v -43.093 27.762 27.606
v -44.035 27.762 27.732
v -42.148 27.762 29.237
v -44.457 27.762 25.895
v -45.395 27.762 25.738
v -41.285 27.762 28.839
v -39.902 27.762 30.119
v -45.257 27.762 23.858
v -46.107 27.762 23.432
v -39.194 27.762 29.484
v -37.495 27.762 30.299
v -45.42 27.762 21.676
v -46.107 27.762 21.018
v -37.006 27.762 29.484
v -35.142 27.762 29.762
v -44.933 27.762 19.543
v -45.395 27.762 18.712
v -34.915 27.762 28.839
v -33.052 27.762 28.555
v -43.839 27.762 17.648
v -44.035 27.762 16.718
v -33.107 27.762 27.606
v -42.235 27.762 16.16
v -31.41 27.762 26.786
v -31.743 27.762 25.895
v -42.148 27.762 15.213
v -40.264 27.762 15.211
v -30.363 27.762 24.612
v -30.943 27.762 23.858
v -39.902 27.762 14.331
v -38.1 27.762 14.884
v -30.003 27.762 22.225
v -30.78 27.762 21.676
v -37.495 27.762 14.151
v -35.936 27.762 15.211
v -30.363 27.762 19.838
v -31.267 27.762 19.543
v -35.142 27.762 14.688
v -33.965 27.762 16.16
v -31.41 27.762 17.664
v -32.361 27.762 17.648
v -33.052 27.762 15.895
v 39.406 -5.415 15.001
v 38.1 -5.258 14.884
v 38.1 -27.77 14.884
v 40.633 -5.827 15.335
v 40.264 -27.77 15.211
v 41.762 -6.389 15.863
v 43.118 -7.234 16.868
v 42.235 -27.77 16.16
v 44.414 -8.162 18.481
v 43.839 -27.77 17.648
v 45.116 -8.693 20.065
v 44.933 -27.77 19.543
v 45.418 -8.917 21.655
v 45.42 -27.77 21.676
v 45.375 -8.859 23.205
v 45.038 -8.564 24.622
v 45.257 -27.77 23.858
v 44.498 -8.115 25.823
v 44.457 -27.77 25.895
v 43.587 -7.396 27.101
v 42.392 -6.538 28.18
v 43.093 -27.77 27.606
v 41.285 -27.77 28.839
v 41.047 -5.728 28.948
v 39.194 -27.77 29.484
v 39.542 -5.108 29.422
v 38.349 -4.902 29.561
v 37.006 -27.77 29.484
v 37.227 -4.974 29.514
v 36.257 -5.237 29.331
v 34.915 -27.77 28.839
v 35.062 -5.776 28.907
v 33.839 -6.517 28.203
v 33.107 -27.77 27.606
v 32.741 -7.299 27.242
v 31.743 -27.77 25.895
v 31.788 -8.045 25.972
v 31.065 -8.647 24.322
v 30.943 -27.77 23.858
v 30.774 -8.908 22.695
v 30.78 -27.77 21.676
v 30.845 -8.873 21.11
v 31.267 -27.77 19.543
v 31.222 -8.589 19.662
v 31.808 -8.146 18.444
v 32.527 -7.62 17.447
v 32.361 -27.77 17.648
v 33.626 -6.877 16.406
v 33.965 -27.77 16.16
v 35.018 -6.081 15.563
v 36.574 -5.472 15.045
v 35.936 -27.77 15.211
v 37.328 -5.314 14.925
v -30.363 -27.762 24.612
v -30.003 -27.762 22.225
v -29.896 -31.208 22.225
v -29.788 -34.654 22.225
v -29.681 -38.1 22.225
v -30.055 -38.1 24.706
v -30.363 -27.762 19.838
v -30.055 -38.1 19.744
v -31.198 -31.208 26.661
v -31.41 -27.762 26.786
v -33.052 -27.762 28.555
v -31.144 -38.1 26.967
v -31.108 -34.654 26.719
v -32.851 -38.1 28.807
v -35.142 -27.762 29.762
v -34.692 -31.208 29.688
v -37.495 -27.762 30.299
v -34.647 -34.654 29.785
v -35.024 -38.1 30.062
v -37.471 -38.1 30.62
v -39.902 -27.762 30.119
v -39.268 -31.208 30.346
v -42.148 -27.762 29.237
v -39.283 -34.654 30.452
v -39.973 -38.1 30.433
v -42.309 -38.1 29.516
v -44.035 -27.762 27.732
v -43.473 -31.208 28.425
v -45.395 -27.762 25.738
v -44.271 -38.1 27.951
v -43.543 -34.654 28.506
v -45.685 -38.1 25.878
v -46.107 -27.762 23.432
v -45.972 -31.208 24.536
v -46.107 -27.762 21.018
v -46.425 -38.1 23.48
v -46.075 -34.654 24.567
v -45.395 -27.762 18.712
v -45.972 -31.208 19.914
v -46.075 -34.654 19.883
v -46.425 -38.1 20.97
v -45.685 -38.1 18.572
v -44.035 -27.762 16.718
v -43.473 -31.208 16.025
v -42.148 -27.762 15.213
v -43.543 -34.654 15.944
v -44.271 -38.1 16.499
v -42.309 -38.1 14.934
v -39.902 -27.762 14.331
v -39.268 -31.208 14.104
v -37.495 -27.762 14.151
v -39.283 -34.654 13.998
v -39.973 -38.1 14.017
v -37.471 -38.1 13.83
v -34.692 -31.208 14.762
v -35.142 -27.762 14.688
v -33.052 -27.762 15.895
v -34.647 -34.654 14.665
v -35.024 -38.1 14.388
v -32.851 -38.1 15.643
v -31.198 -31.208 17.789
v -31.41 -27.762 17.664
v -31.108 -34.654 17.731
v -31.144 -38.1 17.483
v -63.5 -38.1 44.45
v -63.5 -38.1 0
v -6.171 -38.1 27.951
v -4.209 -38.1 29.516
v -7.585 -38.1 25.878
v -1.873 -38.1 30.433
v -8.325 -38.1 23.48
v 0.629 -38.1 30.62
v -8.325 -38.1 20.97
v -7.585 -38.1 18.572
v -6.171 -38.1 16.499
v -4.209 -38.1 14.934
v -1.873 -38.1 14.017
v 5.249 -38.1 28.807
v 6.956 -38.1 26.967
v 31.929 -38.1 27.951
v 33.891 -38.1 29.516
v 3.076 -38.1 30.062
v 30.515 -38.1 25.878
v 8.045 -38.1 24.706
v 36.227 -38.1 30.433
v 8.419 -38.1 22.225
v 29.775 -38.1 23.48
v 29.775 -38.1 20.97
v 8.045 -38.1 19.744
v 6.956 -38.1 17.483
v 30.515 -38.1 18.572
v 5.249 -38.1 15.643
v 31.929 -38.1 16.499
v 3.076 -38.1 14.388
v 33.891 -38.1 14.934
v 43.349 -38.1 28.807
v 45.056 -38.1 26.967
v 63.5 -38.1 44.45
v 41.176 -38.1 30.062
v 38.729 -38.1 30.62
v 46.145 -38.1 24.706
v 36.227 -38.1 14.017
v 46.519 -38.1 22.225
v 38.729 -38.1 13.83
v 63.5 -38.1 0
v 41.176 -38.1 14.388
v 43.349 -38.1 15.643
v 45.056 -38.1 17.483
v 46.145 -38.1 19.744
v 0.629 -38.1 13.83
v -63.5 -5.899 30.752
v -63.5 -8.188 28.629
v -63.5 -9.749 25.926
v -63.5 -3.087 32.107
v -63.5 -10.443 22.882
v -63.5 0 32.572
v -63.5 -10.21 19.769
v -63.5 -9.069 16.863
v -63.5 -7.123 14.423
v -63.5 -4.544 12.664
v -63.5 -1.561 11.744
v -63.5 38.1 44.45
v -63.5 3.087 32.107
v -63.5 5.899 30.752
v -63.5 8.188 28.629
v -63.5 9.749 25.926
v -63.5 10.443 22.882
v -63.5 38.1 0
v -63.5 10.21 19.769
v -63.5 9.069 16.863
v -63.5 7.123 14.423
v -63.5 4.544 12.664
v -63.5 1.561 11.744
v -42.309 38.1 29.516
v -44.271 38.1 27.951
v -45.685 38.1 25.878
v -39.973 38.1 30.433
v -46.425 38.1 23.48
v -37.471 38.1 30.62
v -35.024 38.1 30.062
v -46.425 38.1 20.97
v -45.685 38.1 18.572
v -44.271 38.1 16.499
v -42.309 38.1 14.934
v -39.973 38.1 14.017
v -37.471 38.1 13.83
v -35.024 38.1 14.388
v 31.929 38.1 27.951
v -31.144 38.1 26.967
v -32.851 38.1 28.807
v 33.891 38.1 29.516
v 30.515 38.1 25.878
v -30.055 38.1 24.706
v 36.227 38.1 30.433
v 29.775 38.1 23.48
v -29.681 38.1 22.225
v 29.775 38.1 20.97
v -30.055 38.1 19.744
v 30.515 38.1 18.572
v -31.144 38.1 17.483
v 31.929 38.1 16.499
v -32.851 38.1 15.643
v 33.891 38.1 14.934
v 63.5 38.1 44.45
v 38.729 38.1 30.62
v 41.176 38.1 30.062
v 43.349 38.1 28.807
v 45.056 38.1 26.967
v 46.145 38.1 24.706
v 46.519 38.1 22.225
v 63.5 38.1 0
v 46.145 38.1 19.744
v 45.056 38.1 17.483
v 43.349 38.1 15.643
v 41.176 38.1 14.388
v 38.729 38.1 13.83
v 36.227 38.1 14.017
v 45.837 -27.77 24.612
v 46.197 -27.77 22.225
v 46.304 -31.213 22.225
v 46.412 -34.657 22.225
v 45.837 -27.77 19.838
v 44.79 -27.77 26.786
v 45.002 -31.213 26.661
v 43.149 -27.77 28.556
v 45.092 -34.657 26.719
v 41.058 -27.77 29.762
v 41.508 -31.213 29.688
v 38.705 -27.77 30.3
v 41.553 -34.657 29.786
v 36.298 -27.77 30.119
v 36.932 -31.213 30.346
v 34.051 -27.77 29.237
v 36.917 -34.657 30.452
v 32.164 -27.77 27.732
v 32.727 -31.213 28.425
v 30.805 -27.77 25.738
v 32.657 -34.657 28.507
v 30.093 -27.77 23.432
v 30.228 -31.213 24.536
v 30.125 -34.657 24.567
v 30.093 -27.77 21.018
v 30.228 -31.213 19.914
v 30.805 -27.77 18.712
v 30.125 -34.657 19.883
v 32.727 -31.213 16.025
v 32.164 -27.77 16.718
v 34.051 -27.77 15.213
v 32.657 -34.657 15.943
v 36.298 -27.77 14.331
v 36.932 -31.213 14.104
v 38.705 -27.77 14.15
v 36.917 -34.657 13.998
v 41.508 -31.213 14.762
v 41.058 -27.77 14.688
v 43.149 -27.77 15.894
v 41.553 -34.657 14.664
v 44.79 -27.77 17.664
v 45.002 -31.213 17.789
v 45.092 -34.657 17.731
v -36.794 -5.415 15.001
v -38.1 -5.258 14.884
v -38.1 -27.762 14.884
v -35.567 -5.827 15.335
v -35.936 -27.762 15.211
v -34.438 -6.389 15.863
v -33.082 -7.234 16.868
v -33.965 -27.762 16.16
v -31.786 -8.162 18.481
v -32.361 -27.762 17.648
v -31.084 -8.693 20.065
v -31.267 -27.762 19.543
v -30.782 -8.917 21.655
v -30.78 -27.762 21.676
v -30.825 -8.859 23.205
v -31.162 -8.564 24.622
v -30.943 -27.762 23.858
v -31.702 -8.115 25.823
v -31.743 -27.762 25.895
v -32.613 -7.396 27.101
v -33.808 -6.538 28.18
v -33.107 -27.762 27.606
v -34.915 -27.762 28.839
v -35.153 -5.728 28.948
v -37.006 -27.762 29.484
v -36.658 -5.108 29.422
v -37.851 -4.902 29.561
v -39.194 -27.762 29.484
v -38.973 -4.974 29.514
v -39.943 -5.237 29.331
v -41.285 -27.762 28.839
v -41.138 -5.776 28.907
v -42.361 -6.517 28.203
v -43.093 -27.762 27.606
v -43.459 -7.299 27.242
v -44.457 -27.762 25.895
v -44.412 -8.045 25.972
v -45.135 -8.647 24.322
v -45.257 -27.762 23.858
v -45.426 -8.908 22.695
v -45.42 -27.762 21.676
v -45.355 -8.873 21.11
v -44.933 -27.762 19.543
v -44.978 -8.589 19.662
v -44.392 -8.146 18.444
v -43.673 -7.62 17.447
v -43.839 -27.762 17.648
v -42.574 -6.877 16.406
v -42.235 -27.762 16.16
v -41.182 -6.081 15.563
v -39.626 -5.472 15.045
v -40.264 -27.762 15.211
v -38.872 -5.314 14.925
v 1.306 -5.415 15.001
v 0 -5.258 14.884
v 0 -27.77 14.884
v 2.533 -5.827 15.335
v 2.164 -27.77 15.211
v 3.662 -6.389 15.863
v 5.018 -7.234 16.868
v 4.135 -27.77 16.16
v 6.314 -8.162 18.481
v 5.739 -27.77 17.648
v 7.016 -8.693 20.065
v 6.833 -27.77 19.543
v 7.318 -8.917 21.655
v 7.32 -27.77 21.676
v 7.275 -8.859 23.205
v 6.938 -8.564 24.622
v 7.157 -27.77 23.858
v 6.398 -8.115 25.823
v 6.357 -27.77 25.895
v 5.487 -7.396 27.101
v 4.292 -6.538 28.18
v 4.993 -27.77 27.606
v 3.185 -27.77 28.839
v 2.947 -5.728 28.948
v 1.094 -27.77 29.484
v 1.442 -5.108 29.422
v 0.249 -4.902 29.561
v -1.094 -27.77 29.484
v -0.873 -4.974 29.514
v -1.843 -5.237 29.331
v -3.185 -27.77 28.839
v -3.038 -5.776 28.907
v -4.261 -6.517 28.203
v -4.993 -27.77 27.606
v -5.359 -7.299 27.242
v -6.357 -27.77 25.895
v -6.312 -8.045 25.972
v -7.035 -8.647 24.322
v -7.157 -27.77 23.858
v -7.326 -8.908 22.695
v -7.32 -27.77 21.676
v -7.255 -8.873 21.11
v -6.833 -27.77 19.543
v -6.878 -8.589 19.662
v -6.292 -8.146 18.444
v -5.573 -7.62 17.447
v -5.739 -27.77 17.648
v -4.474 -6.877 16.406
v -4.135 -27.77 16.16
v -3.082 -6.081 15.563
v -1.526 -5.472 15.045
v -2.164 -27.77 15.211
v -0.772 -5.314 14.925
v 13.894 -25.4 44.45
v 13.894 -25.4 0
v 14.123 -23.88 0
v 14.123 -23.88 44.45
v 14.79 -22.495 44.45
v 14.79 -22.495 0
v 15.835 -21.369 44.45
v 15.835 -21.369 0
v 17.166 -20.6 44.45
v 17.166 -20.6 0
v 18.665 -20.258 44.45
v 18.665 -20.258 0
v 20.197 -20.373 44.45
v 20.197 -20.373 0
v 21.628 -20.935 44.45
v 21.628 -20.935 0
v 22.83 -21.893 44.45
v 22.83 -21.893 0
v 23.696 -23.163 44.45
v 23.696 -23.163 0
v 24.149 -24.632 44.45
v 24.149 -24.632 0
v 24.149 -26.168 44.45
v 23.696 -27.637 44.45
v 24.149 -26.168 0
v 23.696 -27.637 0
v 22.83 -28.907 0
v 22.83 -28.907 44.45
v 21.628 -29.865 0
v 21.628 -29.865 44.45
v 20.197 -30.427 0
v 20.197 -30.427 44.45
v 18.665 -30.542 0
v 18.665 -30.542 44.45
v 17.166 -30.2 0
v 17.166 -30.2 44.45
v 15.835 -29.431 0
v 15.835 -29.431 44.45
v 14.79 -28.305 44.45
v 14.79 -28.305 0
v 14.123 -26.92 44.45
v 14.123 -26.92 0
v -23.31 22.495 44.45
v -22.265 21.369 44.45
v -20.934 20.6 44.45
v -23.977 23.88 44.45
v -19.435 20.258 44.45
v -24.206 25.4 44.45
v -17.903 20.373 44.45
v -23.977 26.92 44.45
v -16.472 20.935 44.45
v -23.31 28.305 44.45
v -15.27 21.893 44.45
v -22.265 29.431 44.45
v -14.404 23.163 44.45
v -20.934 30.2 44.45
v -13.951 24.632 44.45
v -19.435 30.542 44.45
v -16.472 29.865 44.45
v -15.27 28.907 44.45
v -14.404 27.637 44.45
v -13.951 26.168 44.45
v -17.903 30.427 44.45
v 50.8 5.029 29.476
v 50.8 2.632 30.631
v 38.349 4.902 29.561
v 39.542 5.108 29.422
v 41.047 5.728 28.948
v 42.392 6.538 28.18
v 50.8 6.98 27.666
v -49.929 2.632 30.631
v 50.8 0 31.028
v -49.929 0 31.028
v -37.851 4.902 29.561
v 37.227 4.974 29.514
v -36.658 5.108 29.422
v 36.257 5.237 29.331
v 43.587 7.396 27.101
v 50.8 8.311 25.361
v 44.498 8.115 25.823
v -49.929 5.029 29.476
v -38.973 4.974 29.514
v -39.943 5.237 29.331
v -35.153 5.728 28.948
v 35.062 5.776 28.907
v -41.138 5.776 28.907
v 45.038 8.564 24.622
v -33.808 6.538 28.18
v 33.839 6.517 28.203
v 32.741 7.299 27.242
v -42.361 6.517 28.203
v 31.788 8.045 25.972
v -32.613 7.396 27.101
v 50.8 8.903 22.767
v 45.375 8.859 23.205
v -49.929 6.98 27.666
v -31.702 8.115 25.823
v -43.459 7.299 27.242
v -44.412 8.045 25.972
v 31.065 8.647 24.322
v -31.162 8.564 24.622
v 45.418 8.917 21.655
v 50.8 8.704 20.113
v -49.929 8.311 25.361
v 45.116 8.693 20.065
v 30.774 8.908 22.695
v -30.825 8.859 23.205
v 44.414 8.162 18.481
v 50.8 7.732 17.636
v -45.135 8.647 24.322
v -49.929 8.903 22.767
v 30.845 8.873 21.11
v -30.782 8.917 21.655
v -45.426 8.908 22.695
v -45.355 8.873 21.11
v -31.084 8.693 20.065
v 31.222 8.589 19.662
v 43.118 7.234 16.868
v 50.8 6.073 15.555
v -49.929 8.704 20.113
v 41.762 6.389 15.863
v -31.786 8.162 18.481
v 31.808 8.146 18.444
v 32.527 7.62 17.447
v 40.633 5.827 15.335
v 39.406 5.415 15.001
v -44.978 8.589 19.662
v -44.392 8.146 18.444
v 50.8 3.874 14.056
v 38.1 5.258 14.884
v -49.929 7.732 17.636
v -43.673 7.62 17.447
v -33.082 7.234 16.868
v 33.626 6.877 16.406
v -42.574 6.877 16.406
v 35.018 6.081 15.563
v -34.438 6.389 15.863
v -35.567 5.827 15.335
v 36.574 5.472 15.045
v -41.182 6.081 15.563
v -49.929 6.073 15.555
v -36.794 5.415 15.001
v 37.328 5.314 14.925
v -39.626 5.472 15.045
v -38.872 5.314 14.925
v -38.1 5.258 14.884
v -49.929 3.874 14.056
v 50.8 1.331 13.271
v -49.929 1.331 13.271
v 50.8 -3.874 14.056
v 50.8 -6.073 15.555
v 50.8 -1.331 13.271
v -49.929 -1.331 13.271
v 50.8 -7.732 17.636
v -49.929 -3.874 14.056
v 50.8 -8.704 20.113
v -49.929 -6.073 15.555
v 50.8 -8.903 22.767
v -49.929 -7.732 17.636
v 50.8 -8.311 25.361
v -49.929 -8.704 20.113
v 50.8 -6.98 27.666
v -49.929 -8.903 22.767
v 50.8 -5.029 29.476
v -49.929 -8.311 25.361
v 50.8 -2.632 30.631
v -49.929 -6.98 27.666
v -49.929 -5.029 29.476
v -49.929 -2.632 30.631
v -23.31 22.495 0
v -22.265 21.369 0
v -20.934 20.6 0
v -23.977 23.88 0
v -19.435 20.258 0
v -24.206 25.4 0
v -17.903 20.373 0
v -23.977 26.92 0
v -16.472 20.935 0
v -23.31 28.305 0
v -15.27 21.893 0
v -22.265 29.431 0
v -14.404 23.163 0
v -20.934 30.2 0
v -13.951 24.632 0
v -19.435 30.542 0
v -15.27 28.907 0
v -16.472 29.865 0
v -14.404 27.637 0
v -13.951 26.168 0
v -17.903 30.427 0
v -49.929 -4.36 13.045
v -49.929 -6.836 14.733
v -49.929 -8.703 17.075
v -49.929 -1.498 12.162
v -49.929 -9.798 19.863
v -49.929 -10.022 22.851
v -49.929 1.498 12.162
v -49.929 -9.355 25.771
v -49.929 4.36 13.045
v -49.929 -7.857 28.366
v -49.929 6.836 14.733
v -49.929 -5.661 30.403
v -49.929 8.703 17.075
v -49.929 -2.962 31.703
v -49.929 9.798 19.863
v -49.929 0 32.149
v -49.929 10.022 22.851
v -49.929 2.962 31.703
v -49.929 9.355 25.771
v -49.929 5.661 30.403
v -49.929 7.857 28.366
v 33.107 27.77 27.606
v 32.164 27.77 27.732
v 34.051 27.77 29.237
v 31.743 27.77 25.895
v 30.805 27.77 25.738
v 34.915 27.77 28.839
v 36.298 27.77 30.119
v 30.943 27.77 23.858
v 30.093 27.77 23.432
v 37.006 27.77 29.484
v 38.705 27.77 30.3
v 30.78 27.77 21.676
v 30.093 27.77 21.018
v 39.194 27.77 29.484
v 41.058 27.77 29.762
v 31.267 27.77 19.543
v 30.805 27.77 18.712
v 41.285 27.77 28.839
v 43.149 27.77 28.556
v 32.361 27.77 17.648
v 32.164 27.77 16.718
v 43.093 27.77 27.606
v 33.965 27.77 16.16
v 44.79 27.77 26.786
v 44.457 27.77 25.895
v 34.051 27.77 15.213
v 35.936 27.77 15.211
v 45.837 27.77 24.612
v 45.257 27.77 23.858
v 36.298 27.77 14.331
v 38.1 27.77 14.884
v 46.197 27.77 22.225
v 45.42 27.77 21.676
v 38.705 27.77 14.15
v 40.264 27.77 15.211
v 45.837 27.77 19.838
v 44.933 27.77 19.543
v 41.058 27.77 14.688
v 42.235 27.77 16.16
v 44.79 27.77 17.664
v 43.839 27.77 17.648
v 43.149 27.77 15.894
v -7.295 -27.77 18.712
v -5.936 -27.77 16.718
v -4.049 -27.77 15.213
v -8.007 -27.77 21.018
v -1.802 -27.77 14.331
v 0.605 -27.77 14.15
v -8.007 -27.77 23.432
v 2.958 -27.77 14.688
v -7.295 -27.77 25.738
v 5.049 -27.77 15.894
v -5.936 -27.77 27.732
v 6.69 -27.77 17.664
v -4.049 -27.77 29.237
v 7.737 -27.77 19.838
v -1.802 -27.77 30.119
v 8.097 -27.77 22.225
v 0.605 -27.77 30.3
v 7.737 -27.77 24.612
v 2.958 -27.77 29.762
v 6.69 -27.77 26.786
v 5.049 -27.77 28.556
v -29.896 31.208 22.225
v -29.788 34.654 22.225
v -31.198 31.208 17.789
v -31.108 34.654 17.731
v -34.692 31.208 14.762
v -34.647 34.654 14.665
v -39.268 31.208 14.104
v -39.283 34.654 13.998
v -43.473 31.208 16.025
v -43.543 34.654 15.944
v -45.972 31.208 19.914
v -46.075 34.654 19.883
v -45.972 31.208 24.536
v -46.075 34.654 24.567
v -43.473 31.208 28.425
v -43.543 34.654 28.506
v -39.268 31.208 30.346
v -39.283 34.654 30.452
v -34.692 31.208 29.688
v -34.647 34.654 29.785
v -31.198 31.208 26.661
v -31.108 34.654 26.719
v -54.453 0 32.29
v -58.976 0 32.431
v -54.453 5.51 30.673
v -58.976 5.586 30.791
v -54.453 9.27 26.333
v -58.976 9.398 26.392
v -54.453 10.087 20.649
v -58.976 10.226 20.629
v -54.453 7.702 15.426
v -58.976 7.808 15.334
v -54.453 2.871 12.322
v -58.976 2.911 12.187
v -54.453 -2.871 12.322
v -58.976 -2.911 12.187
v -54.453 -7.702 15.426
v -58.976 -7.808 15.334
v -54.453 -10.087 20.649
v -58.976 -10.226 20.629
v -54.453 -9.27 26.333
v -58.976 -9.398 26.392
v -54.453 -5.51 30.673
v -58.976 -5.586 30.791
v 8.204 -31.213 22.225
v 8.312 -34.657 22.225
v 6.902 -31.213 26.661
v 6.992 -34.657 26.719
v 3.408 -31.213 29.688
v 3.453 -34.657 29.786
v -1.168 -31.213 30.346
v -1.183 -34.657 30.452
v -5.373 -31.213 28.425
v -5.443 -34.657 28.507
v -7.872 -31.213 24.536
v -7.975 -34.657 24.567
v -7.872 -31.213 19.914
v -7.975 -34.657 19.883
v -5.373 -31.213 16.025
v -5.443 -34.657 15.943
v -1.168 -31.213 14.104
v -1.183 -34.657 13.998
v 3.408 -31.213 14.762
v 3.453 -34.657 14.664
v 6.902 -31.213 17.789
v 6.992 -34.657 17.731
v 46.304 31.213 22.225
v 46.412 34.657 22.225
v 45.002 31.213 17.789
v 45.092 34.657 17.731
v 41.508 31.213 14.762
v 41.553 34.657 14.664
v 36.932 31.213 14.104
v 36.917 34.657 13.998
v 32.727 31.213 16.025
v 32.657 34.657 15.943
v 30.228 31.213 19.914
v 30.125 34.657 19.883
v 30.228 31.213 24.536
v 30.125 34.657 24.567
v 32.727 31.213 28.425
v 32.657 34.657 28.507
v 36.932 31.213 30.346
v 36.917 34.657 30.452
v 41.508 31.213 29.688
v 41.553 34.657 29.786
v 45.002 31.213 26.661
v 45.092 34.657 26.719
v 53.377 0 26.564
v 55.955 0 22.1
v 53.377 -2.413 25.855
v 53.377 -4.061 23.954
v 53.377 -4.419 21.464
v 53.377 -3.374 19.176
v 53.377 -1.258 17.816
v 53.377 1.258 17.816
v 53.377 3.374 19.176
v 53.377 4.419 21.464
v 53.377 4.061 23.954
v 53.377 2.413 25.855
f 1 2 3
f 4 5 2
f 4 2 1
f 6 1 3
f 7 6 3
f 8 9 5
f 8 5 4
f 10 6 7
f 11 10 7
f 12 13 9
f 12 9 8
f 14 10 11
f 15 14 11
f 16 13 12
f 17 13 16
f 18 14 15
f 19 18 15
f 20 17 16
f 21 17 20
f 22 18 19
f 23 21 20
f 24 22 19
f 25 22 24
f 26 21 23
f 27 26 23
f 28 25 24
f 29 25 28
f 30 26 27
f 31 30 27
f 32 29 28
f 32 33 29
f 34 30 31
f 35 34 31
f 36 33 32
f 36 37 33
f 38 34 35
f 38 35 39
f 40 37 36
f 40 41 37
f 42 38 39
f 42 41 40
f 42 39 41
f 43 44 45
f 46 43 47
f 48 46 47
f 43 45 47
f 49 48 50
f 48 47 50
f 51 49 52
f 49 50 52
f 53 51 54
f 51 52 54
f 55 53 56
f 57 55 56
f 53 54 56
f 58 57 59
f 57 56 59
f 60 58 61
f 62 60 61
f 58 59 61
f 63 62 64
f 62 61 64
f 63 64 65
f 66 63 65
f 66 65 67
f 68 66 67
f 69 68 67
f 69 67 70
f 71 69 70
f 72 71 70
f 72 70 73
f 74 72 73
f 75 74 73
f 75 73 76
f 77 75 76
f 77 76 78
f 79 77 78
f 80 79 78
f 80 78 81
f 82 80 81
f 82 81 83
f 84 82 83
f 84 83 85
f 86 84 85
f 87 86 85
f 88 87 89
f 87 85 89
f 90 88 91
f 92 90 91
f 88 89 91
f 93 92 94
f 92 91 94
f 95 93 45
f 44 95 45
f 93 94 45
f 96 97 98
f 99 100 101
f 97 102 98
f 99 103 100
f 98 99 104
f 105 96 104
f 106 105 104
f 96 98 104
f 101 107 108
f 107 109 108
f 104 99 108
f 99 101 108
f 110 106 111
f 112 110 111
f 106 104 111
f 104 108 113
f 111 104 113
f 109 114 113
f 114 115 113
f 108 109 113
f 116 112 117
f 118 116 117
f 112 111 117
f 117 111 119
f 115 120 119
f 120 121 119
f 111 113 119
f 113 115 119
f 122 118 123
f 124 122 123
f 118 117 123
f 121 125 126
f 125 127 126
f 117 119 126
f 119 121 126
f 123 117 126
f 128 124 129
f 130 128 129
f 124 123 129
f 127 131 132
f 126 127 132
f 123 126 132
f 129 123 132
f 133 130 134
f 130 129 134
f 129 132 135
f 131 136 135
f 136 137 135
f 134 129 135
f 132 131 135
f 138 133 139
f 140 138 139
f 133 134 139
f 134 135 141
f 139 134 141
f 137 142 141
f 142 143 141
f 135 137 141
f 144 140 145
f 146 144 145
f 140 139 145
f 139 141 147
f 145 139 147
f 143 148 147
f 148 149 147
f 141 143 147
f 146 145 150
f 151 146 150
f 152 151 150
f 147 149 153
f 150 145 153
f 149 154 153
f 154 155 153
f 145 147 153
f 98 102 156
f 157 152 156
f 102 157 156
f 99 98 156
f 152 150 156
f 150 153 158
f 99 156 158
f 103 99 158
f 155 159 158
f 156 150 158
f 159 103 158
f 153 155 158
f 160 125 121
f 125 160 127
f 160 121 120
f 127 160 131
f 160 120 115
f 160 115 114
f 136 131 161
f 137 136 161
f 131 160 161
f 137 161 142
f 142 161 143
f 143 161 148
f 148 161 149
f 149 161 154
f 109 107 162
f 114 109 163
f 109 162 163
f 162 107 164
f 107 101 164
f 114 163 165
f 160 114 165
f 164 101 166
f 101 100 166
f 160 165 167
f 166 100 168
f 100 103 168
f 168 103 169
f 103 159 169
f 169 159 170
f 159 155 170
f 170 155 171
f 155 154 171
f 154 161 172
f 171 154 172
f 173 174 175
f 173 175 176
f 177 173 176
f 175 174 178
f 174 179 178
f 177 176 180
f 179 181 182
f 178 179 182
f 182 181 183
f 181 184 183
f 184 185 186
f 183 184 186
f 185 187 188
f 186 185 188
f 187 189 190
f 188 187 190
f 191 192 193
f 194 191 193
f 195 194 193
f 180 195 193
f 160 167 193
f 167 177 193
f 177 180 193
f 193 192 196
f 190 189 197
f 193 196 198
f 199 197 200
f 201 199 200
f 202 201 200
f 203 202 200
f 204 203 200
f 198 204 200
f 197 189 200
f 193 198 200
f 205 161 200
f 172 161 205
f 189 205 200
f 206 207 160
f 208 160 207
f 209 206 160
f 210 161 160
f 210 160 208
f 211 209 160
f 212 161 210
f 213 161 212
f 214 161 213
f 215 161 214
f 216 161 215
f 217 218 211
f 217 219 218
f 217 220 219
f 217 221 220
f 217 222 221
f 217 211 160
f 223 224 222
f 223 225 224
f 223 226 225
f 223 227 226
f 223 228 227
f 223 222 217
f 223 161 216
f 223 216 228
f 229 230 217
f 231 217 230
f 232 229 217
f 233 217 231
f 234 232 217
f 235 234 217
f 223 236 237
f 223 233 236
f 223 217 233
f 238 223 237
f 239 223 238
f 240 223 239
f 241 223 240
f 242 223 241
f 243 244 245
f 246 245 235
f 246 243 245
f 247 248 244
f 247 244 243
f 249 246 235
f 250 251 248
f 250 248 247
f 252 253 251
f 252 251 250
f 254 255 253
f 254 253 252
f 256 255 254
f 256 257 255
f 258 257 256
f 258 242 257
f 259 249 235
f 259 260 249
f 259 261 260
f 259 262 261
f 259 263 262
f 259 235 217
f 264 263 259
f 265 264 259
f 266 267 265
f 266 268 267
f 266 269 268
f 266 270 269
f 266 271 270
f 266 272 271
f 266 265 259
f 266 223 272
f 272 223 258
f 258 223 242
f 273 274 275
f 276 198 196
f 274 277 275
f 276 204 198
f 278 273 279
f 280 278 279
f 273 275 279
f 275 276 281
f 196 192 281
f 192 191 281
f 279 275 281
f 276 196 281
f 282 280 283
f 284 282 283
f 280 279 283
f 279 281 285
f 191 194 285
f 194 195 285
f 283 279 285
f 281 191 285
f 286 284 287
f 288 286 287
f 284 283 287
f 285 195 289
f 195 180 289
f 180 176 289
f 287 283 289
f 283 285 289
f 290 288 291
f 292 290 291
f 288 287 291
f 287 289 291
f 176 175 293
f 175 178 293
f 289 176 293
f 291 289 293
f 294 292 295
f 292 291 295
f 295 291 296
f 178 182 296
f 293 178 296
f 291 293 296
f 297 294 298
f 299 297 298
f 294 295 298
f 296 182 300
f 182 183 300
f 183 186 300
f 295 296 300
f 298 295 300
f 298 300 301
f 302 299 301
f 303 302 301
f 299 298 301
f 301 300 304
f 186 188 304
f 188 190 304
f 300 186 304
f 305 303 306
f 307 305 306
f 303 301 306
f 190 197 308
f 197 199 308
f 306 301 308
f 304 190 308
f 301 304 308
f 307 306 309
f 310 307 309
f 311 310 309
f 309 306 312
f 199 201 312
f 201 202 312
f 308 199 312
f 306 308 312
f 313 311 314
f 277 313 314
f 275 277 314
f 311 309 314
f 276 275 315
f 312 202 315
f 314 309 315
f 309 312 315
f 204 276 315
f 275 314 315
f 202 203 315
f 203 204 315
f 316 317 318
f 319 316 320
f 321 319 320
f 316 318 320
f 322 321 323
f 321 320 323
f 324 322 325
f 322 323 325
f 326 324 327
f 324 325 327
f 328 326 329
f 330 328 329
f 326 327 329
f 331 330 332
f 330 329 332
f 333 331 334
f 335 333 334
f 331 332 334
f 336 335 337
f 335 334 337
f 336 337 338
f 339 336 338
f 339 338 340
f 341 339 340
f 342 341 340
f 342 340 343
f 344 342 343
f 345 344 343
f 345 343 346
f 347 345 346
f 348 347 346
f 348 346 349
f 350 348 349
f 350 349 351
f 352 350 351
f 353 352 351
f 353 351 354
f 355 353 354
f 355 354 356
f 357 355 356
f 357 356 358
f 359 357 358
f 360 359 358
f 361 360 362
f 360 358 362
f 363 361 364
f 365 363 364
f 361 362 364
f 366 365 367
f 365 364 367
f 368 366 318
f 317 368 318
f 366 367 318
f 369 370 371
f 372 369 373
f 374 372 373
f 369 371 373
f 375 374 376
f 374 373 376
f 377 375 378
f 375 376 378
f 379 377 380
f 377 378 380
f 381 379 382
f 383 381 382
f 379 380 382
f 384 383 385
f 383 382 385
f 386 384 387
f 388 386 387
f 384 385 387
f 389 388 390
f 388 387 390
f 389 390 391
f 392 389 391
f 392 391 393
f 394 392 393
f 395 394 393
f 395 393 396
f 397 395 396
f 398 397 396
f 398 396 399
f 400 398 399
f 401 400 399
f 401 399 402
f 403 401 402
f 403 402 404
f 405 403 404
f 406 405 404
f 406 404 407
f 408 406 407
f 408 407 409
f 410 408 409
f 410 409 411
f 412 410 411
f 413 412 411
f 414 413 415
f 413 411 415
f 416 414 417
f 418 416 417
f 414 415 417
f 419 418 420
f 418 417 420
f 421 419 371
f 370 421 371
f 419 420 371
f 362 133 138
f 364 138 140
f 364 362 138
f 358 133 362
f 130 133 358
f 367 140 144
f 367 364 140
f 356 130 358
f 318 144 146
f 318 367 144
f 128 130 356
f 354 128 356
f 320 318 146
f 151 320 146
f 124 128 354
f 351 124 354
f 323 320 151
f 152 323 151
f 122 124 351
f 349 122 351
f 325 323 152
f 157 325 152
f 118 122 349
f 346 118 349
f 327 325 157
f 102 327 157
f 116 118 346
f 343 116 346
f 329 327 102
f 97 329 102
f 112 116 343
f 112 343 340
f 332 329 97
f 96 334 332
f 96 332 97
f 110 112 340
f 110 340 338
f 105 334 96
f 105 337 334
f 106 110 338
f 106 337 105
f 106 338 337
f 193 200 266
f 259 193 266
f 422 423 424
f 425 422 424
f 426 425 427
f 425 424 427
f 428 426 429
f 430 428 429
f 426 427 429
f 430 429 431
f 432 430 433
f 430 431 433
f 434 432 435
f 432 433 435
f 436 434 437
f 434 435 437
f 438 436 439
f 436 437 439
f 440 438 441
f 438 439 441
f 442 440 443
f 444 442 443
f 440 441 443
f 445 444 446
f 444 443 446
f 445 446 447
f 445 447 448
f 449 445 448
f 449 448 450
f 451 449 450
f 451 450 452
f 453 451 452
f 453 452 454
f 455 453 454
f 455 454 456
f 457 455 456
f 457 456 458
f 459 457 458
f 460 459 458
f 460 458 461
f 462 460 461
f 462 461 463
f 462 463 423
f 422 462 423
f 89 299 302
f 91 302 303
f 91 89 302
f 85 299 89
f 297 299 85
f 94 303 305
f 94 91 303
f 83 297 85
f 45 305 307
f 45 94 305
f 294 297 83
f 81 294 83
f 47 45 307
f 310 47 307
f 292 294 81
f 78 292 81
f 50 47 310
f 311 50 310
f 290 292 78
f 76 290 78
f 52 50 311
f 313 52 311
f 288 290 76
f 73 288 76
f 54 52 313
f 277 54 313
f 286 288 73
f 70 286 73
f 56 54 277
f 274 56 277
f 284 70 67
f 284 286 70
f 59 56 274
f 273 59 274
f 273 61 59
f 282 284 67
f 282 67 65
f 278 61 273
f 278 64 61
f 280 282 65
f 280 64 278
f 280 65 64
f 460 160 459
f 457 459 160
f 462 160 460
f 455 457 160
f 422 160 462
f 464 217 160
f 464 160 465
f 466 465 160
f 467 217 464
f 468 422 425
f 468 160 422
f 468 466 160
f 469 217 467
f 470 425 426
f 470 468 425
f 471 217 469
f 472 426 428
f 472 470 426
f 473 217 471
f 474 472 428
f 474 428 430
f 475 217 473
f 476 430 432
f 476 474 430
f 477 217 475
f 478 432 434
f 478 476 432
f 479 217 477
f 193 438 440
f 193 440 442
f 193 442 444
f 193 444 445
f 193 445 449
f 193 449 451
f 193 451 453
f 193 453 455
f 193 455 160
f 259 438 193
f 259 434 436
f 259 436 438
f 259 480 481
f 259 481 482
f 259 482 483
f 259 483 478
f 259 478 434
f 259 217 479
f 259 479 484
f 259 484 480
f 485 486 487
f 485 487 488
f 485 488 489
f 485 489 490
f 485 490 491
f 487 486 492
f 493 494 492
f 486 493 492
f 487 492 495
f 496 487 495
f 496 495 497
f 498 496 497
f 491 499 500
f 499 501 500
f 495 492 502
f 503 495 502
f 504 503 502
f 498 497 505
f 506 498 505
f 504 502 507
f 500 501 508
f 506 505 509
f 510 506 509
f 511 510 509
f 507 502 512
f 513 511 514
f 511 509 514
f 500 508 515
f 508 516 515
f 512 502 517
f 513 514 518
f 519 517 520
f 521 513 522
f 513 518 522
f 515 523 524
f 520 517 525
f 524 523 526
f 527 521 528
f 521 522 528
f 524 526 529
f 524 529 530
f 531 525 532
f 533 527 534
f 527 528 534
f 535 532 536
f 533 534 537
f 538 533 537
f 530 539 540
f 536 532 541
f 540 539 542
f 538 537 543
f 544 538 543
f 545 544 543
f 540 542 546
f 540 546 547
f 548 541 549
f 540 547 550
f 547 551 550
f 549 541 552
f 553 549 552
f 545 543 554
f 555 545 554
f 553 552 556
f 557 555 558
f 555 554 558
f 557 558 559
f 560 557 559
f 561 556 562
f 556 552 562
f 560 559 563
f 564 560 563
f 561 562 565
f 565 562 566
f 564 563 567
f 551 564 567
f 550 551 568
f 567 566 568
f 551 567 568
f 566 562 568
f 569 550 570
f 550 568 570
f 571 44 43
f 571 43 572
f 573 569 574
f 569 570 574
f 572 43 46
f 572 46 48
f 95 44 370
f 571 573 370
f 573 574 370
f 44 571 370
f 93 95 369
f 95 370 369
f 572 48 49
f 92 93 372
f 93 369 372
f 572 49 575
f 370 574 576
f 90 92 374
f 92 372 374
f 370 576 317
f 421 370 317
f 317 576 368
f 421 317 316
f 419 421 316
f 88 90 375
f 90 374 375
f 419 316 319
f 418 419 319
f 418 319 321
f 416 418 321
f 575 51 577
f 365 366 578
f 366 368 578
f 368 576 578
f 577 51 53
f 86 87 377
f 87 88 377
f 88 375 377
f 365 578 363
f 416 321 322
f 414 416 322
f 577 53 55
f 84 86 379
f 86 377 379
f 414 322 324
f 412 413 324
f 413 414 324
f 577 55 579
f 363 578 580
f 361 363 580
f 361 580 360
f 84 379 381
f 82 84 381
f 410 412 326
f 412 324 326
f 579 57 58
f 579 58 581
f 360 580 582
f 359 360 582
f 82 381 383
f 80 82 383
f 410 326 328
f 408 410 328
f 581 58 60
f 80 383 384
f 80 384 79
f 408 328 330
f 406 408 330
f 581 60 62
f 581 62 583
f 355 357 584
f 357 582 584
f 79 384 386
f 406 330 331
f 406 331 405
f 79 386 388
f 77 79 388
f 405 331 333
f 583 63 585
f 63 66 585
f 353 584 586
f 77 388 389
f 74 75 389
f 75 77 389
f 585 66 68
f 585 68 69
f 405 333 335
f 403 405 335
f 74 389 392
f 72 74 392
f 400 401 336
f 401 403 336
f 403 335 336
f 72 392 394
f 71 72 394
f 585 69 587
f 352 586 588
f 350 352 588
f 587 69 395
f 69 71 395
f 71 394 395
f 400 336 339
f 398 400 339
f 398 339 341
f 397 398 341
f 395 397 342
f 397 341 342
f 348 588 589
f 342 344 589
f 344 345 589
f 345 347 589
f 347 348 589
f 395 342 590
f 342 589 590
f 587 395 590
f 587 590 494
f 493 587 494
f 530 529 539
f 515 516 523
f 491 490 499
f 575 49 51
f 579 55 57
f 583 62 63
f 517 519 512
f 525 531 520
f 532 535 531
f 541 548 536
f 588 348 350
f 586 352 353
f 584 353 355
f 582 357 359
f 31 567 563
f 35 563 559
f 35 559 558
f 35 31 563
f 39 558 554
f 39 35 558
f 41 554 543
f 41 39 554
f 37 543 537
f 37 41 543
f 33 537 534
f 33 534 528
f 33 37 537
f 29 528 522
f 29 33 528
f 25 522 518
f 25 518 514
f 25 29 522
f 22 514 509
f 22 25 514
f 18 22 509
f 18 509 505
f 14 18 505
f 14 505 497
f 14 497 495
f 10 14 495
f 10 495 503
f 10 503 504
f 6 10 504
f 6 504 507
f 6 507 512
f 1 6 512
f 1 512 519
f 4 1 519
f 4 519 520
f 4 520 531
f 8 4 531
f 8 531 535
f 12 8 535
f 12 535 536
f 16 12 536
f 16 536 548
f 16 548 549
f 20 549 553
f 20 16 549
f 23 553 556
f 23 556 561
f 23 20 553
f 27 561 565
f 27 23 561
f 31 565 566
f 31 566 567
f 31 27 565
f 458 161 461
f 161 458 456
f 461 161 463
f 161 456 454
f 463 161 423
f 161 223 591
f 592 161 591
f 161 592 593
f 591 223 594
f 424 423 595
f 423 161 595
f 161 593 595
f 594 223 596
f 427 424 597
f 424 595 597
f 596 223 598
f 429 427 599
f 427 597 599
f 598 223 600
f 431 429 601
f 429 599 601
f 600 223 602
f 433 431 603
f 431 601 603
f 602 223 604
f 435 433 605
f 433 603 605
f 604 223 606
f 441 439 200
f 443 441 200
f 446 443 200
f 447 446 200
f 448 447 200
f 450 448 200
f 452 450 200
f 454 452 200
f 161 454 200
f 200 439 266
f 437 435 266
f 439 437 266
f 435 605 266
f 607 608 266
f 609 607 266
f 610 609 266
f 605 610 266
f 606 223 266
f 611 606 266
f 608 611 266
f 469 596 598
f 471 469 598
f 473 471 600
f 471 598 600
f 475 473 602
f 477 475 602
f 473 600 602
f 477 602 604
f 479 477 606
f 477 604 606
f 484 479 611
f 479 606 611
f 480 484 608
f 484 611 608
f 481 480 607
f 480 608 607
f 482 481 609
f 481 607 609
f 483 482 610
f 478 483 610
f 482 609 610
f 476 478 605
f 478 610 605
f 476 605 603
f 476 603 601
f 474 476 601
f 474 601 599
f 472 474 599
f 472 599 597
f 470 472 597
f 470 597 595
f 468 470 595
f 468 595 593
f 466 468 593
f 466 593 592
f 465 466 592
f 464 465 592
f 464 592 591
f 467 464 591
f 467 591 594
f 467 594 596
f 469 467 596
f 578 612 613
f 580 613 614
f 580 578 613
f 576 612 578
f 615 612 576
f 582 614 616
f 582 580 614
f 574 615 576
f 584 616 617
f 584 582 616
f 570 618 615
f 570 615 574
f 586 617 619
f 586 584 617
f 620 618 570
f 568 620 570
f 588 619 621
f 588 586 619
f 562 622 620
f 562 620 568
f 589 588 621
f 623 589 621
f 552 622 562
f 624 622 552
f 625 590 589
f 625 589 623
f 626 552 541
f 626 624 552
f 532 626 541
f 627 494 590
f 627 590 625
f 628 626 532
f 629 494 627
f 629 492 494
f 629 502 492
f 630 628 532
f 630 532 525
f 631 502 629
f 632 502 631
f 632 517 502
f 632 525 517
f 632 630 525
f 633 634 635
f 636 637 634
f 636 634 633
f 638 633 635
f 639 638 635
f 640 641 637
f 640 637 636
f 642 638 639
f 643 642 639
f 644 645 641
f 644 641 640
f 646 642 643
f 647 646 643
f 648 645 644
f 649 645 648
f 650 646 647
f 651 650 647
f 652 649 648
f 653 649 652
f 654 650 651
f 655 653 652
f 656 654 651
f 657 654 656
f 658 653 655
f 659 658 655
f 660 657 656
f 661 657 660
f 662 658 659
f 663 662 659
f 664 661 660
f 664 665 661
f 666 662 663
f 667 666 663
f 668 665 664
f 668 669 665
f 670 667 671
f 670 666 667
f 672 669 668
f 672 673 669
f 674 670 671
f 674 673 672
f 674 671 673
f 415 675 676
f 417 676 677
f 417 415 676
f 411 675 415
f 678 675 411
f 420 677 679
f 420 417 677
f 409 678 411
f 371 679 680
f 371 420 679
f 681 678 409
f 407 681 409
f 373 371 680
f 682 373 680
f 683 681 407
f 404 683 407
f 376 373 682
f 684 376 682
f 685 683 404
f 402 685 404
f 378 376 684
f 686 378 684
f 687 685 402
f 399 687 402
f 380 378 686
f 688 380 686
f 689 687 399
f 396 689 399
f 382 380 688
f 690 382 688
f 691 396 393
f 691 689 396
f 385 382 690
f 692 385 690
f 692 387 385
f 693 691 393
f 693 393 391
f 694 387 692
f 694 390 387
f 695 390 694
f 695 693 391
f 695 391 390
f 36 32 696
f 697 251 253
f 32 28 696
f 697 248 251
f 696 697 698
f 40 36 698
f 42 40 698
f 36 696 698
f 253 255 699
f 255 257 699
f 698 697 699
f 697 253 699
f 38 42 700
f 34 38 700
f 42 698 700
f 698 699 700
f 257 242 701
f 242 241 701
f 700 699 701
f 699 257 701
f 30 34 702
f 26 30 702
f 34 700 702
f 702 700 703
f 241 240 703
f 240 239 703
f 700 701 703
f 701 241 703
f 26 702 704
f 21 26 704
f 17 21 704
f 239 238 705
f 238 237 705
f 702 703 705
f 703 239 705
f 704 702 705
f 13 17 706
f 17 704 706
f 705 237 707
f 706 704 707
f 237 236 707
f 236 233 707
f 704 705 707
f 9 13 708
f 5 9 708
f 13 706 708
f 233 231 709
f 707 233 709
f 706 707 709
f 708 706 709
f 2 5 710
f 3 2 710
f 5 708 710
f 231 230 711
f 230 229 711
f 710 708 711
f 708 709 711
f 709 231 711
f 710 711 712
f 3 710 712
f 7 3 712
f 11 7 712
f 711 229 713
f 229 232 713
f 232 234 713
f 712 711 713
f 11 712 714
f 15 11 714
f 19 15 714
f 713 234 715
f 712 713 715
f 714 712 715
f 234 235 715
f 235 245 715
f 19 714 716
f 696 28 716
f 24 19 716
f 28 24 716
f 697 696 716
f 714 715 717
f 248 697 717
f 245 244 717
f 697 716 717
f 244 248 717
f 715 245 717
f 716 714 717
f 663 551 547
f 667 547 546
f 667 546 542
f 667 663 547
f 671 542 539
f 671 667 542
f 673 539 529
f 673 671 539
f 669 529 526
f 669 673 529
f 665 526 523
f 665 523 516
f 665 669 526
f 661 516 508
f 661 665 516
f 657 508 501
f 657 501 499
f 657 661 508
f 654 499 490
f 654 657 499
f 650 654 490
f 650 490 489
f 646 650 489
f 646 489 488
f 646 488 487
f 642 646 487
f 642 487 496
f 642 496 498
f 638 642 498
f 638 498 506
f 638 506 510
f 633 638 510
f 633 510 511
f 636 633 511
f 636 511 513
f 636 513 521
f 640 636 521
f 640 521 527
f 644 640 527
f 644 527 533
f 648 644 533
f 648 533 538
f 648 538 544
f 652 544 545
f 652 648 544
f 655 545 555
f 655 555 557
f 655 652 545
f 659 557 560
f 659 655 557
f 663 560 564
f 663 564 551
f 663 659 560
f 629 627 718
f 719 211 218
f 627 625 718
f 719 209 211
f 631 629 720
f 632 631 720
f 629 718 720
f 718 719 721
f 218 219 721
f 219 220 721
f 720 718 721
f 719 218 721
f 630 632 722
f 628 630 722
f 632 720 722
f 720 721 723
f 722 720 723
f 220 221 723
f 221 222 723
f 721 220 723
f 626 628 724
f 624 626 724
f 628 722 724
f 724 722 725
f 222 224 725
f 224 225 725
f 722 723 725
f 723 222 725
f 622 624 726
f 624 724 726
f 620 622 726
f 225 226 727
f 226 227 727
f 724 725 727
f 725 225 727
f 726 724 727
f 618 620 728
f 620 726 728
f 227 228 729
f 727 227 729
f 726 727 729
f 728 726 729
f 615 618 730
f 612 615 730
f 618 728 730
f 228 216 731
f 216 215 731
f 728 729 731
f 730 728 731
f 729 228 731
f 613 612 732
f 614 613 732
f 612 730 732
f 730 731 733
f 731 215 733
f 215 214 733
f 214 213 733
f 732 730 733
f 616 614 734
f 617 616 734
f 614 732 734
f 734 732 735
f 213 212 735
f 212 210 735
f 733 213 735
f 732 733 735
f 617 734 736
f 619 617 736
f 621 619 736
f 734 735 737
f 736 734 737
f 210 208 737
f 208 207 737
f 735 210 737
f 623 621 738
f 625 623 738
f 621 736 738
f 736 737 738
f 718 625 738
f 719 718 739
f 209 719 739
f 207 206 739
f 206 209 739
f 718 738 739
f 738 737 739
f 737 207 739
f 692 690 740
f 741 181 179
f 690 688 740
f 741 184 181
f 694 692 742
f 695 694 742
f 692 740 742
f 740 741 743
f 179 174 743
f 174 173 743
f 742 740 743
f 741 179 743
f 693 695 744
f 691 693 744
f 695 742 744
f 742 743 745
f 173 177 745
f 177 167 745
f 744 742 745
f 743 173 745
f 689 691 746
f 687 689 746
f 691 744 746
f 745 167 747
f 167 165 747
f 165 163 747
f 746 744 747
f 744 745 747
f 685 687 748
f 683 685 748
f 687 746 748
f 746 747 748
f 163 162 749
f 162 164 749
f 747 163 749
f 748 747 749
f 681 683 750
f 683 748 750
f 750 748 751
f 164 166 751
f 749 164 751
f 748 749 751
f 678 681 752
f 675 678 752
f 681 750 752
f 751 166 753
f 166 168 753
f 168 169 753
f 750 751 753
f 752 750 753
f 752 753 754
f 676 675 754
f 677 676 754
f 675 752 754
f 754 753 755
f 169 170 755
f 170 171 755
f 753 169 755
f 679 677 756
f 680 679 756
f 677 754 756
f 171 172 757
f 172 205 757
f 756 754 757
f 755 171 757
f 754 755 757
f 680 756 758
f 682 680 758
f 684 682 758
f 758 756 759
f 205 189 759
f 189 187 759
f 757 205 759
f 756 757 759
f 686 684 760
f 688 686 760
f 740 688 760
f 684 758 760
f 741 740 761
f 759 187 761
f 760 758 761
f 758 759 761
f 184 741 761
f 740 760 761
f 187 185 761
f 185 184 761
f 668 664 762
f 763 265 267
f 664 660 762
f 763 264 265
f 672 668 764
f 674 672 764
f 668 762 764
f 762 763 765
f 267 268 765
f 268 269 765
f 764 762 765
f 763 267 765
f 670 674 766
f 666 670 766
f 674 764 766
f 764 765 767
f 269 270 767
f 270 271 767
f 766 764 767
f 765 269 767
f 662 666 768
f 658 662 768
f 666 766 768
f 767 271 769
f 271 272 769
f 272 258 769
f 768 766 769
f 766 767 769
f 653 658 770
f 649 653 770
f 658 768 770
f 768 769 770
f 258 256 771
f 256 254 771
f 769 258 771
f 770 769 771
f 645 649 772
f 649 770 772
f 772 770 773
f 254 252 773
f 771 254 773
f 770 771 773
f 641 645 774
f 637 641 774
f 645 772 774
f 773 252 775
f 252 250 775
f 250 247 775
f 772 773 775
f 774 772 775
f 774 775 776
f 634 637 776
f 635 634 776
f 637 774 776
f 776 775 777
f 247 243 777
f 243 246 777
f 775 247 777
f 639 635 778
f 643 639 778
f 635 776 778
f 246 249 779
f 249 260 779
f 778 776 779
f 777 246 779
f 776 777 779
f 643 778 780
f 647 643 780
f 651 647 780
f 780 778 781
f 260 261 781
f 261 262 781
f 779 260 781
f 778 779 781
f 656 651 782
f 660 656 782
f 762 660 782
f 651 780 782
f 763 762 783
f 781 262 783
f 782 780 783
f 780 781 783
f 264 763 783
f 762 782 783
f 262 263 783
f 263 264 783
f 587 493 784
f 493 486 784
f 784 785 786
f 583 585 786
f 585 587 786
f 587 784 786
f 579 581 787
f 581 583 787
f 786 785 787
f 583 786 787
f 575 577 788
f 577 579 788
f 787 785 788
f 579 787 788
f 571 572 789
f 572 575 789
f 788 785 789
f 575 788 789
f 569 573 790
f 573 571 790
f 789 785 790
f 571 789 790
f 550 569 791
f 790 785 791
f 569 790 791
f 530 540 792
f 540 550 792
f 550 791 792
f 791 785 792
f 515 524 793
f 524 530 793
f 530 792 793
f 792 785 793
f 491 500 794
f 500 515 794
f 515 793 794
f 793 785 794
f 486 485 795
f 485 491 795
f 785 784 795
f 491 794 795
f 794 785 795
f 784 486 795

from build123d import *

# Parameters (mm, degrees)
SKETCH1_W                = 127
SKETCH1_H                = 76.2
BASE_EXTRUDE_DEPTH       = 44.45
SKETCH13_R               = 10.47242
CUT_EXTRUDE7_DEPTH       = 13.57122
CUT_EXTRUDE7_DRAFT       = -1.783333333
SKETCH14_R               = 8.9281
CUT_EXTRUDE8_DEPTH       = 114.3
SKETCH17_R               = 8.41883
CUT_EXTRUDE10_DEPTH      = 10.33018
CUT_EXTRUDE10_DRAFT      = -1.783333333
CUT_EXTRUDE11_REACH      = 182.583
CUT_EXTRUDE11_END_RADIUS = 8.9281
SKETCH18_R               = 7.3406
SKETCH21_R               = 8.41883
CUT_EXTRUDE13_DEPTH      = 10.33018
CUT_EXTRUDE13_DRAFT      = -1.783333333
CUT_EXTRUDE14_REACH      = 151.643
CUT_EXTRUDE14_END_RADIUS = 8.9281
SKETCH22_R               = 7.3406
SKETCH25_R               = 8.41883
CUT_EXTRUDE16_DEPTH      = 10.3378
CUT_EXTRUDE16_DRAFT      = -1.783333333
CUT_EXTRUDE17_REACH      = 124.053
CUT_EXTRUDE17_END_RADIUS = 8.9281
SKETCH26_R               = 7.3406
MIRROR1_COPY_1_SKETCH_R  = 8.41883
MIRROR1_COPY_1_DEPTH     = 10.33018
MIRROR1_COPY_1_DRAFT     = -1.783333333
MIRROR1_COPY_2_SKETCH_R  = 8.41883
MIRROR1_COPY_2_DEPTH     = 10.3378
MIRROR1_COPY_2_DRAFT     = -1.783333333
SKETCH29_R               = 5.1562
CUT_EXTRUDE19_DEPTH      = 87.36933773


with BuildPart() as part:
    # Sketch1 → Base-Extrude (new body)
    with BuildSketch(Plane.XY):
        Rectangle(SKETCH1_W, SKETCH1_H)
    extrude(amount=BASE_EXTRUDE_DEPTH)


with BuildPart() as cut_extrude7_tool:
    # Sketch13 → Cut-Extrude7 (with draft: the straight prism first)
    with BuildSketch(Plane(origin=(-63.5, 42.382338567, -29.074180248), x_dir=(0, 0, 1), z_dir=(-1, 0, 0))):
        with Locations((51.173800102, -42.382338567)):
            Circle(SKETCH13_R)
    extrude(amount=-CUT_EXTRUDE7_DEPTH)
    # Cut-Extrude7: the draft: its side faces are tilted about the plane it starts from
    cut_extrude7_sides = [cut_extrude7_tool.faces().sort_by_distance(p)[0] for p in [
        (-56.71439, 0, 11.627199854),
    ]]
    draft(cut_extrude7_sides, Plane(origin=(-63.5, 42.382338567, -29.074180248), x_dir=(0, 0, 1), z_dir=(-1, 0, 0)), CUT_EXTRUDE7_DRAFT)


with BuildPart() as part_1:
    add(part.part)

    # Cut-Extrude7: cut by cut_extrude7_tool
    add(cut_extrude7_tool.part, mode=Mode.SUBTRACT)

    # Sketch14 → Cut-Extrude8 (cut)
    with BuildSketch(Plane(origin=(-63.5, 38.1, -63.5), x_dir=(0, 0, 1), z_dir=(-1, 0, 0))):
        with Locations((85.599619854, -38.1)):
            Circle(SKETCH14_R)
    extrude(amount=-CUT_EXTRUDE8_DEPTH, mode=Mode.SUBTRACT)

    # Cut-Extrude9 cone 1 section (through the dimple's axis) → Cut-Extrude9 (revolve, cut)
    with BuildSketch(Plane(origin=(50.8, 0, 22.099619854), x_dir=(0, 0, 1), z_dir=(0, 1, 0))):
        Polygon((0, 0), (8.9281, 0), (0, 5.154640938), align=None)
    revolve(axis=Axis((50.8, 0, 22.099619854), (1, 0, 0)), mode=Mode.SUBTRACT)


with BuildPart() as cut_extrude10_tool:
    # Sketch17 → Cut-Extrude10 (with draft: the straight prism first)
    with BuildSketch(Plane(origin=(97.86363054, -38.1, 25.99710819), x_dir=(1, 0, 0), z_dir=(0, -1, 0))):
        with Locations((-59.76363054, -3.77210819)):
            Circle(SKETCH17_R)
    extrude(amount=-CUT_EXTRUDE10_DEPTH)
    # Cut-Extrude10: the draft: its side faces are tilted about the plane it starts from
    cut_extrude10_sides = [cut_extrude10_tool.faces().sort_by_distance(p)[0] for p in [
        (29.68117, -32.93491, 22.225),
    ]]
    draft(cut_extrude10_sides, Plane(origin=(97.86363054, -38.1, 25.99710819), x_dir=(1, 0, 0), z_dir=(0, -1, 0)), CUT_EXTRUDE10_DRAFT)


with BuildPart() as part_2:
    add(part_1.part)

    # Cut-Extrude10: cut by cut_extrude10_tool
    add(cut_extrude10_tool.part, mode=Mode.SUBTRACT)

    # Cut-Extrude11: up to this cylinder (the profile starts outside it)
    cut_extrude11_end = Plane(origin=(38.1, 0, 22.099619854), z_dir=(-1, 0, 0)) * Cylinder(CUT_EXTRUDE11_END_RADIUS, 384.0222, mode=Mode.PRIVATE)
    # Sketch18 → Cut-Extrude11 (cut, up to the surface)
    with BuildSketch(Plane(origin=(98.70252821, -38.1, 22.225), x_dir=(1, 0, 0), z_dir=(0, -1, 0)), mode=Mode.PRIVATE) as cut_extrude11_sk1:
        with Locations(Location((-60.60252821, 0, 0), (0, 0, 270))):
            Circle(SKETCH18_R)
    cut_extrude11_tool1 = extrude(cut_extrude11_sk1.sketch, amount=-CUT_EXTRUDE11_REACH, mode=Mode.PRIVATE) - cut_extrude11_end
    cut_extrude11 = cut_extrude11_tool1.solids().sort_by_distance((38.1, -38.1, 22.225))[0]
    add(cut_extrude11, mode=Mode.SUBTRACT)


with BuildPart() as cut_extrude13_tool:
    # Sketch21 → Cut-Extrude13 (with draft: the straight prism first)
    with BuildSketch(Plane(origin=(60.495960608, -38.1, 35.437611041), x_dir=(1, 0, 0), z_dir=(0, -1, 0))):
        with Locations((-60.495960608, -13.212611041)):
            Circle(SKETCH21_R)
    extrude(amount=-CUT_EXTRUDE13_DEPTH)
    # Cut-Extrude13: the draft: its side faces are tilted about the plane it starts from
    cut_extrude13_sides = [cut_extrude13_tool.faces().sort_by_distance(p)[0] for p in [
        (-8.41883, -32.93491, 22.225),
    ]]
    draft(cut_extrude13_sides, Plane(origin=(60.495960608, -38.1, 35.437611041), x_dir=(1, 0, 0), z_dir=(0, -1, 0)), CUT_EXTRUDE13_DRAFT)


with BuildPart() as part_3:
    add(part_2.part)

    # Cut-Extrude13: cut by cut_extrude13_tool
    add(cut_extrude13_tool.part, mode=Mode.SUBTRACT)

    # Cut-Extrude14: up to this cylinder (the profile starts outside it)
    cut_extrude14_end = Plane(origin=(0, 0, 22.099619854), z_dir=(-1, 0, 0)) * Cylinder(CUT_EXTRUDE14_END_RADIUS, 322.1422, mode=Mode.PRIVATE)
    # Sketch22 → Cut-Extrude14 (cut, up to the surface)
    with BuildSketch(Plane(origin=(61.334858278, -38.1, 31.665502851), x_dir=(1, 0, 0), z_dir=(0, -1, 0)), mode=Mode.PRIVATE) as cut_extrude14_sk1:
        with Locations(Location((-61.334858278, -9.440502851, 0), (0, 0, 270))):
            Circle(SKETCH22_R)
    cut_extrude14_tool1 = extrude(cut_extrude14_sk1.sketch, amount=-CUT_EXTRUDE14_REACH, mode=Mode.PRIVATE) - cut_extrude14_end
    add(cut_extrude14_tool1.solids().sort_by_distance((0, -38.1, 22.225))[0], mode=Mode.SUBTRACT)


with BuildPart() as cut_extrude16_tool:
    # Sketch25 → Cut-Extrude16 (with draft: the straight prism first)
    with BuildSketch(Plane(origin=(25.307359991, -38.1, 36.236677515), x_dir=(1, 0, 0), z_dir=(0, -1, 0))):
        with Locations((-63.407359991, -14.011677515)):
            Circle(SKETCH25_R)
    extrude(amount=-CUT_EXTRUDE16_DEPTH)
    # Cut-Extrude16: the draft: its side faces are tilted about the plane it starts from
    cut_extrude16_sides = [cut_extrude16_tool.faces().sort_by_distance(p)[0] for p in [
        (-46.51883, -32.9311, 22.225),
    ]]
    draft(cut_extrude16_sides, Plane(origin=(25.307359991, -38.1, 36.236677515), x_dir=(1, 0, 0), z_dir=(0, -1, 0)), CUT_EXTRUDE16_DRAFT)


with BuildPart() as part_4:
    add(part_3.part)

    # Cut-Extrude16: cut by cut_extrude16_tool
    add(cut_extrude16_tool.part, mode=Mode.SUBTRACT)

    # Cut-Extrude17: up to this cylinder (the profile starts outside it)
    cut_extrude17_end = Plane(origin=(-38.1, 0, 22.099619854), z_dir=(-1, 0, 0)) * Cylinder(CUT_EXTRUDE17_END_RADIUS, 266.9622, mode=Mode.PRIVATE)
    # Sketch26 → Cut-Extrude17 (cut, up to the surface)
    with BuildSketch(Plane(origin=(26.146257661, -38.1, 32.464569325), x_dir=(1, 0, 0), z_dir=(0, -1, 0)), mode=Mode.PRIVATE) as cut_extrude17_sk1:
        with Locations(Location((-64.246257661, -10.239569325, 0), (0, 0, 270))):
            Circle(SKETCH26_R)
    cut_extrude17_tool1 = extrude(cut_extrude17_sk1.sketch, amount=-CUT_EXTRUDE17_REACH, mode=Mode.PRIVATE) - cut_extrude17_end
    cut_extrude17 = cut_extrude17_tool1.solids().sort_by_distance((-38.1, -38.1, 22.225))[0]
    add(cut_extrude17, mode=Mode.SUBTRACT)

    # Mirror1: Cut-Extrude11, Cut-Extrude17 across plane
    add(cut_extrude11.mirror(Plane.ZX), mode=Mode.SUBTRACT)
    add(cut_extrude17.mirror(Plane.ZX), mode=Mode.SUBTRACT)


with BuildPart() as mirror1_copy_1_tool:
    # Mirror1 copy 1 sketch → Mirror1 copy 1 (with draft: the straight prism first)
    with BuildSketch(Plane(origin=(97.86363054, 38.1, 25.99710819), x_dir=(1, 0, 0), z_dir=(0, 1, 0))):
        with Locations((-59.76363054, 3.77210819)):
            Circle(MIRROR1_COPY_1_SKETCH_R)
    extrude(amount=-MIRROR1_COPY_1_DEPTH)
    # Mirror1 copy 1: the draft: its side faces are tilted about the plane it starts from
    mirror1_copy_1_sides = [mirror1_copy_1_tool.faces().sort_by_distance(p)[0] for p in [
        (29.68117, 32.93491, 22.225),
    ]]
    draft(mirror1_copy_1_sides, Plane(origin=(97.86363054, 38.1, 25.99710819), x_dir=(1, 0, 0), z_dir=(0, 1, 0)), MIRROR1_COPY_1_DRAFT)


with BuildPart() as part_5:
    add(part_4.part)

    # Mirror1 copy 1: cut by mirror1_copy_1_tool
    add(mirror1_copy_1_tool.part, mode=Mode.SUBTRACT)


with BuildPart() as mirror1_copy_2_tool:
    # Mirror1 copy 2 sketch → Mirror1 copy 2 (with draft: the straight prism first)
    with BuildSketch(Plane(origin=(25.307359991, 38.1, 36.236677515), x_dir=(1, 0, 0), z_dir=(0, 1, 0))):
        with Locations((-63.407359991, 14.011677515)):
            Circle(MIRROR1_COPY_2_SKETCH_R)
    extrude(amount=-MIRROR1_COPY_2_DEPTH)
    # Mirror1 copy 2: the draft: its side faces are tilted about the plane it starts from
    mirror1_copy_2_sides = [mirror1_copy_2_tool.faces().sort_by_distance(p)[0] for p in [
        (-46.51883, 32.9311, 22.225),
    ]]
    draft(mirror1_copy_2_sides, Plane(origin=(25.307359991, 38.1, 36.236677515), x_dir=(1, 0, 0), z_dir=(0, 1, 0)), MIRROR1_COPY_2_DRAFT)


with BuildPart() as part_6:
    add(part_5.part)

    # Mirror1 copy 2: cut by mirror1_copy_2_tool
    add(mirror1_copy_2_tool.part, mode=Mode.SUBTRACT)

    # Sketch29 → Cut-Extrude19 (cut, through all)
    with BuildSketch(Plane(origin=(0, 0, 0), x_dir=(-1, 0, 0), z_dir=(0, 0, -1))):
        with Locations((-19.05, -25.4)):
            Circle(SKETCH29_R)
        with Locations((19.05, 25.4)):
            Circle(SKETCH29_R)
    extrude(amount=-CUT_EXTRUDE19_DEPTH, mode=Mode.SUBTRACT)


solid = part_6.part
